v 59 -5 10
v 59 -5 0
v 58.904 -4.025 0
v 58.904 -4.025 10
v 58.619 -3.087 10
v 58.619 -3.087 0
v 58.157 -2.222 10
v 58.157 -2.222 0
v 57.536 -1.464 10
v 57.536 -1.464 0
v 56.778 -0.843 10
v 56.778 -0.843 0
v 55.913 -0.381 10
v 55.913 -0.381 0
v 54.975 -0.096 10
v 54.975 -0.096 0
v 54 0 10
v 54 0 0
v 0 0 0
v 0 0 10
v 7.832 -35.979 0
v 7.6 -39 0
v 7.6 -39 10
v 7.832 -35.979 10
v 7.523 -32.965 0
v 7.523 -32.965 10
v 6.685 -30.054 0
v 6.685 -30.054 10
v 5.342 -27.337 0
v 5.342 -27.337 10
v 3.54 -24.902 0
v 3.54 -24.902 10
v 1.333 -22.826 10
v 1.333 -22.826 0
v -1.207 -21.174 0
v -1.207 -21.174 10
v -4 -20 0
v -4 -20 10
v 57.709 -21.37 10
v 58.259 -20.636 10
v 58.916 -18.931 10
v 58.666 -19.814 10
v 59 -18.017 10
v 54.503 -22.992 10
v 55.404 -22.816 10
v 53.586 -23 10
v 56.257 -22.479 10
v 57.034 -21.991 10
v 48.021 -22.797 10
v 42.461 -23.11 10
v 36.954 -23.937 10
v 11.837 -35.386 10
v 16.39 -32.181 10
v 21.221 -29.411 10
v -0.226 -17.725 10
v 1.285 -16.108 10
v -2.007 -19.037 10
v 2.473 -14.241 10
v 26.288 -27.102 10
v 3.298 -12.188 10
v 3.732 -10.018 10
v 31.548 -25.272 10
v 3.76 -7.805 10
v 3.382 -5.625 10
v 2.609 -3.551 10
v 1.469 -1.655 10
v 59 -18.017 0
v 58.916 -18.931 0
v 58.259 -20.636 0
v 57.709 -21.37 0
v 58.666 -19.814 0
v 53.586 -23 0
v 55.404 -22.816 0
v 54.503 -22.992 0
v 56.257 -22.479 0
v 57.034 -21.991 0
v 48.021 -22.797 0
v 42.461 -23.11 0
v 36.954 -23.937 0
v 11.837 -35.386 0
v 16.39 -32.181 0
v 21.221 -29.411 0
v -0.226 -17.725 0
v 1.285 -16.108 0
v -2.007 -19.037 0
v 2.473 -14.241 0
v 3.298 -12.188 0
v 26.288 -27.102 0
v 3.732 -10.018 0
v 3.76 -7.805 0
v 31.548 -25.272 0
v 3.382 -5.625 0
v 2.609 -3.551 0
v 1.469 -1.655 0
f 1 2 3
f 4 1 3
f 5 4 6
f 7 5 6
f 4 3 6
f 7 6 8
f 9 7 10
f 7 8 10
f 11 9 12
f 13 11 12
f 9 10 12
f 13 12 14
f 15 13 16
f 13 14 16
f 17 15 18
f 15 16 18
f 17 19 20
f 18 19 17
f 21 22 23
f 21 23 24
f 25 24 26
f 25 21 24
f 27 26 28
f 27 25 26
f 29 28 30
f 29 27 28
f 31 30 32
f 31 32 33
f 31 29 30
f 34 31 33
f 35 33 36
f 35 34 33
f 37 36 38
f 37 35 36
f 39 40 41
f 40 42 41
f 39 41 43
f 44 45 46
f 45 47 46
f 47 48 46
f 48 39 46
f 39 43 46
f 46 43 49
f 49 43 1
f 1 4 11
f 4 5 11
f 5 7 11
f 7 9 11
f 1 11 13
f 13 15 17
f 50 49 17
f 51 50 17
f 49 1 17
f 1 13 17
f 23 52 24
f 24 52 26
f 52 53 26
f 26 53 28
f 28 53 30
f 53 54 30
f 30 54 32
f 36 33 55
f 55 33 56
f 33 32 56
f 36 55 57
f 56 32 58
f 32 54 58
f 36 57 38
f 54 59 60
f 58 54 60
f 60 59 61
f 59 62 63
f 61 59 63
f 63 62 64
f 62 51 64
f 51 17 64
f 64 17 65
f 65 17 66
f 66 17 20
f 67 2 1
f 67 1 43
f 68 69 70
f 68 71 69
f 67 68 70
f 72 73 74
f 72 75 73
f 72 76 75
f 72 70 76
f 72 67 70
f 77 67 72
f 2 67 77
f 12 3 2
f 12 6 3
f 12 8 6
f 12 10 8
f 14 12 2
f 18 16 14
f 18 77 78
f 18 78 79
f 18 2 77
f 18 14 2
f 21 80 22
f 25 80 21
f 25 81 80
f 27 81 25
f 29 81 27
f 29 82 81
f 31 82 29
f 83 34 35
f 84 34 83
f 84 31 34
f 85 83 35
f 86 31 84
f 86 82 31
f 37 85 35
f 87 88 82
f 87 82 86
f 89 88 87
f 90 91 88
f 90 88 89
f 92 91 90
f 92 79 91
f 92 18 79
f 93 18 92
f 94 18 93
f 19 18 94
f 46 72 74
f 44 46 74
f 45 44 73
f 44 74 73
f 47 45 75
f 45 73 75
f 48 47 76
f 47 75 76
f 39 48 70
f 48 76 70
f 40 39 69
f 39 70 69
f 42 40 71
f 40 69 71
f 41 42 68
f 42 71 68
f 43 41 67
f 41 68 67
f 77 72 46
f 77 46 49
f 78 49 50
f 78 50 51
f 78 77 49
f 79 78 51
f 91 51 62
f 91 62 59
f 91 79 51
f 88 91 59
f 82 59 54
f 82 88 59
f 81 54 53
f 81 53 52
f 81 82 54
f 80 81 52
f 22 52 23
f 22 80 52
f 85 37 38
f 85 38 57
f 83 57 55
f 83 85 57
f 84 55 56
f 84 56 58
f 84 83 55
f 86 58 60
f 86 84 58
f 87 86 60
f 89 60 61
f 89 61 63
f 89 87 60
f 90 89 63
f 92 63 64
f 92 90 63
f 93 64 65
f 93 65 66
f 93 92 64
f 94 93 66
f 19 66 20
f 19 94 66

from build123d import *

# Parameters (mm, degrees)
PAD_DEPTH = 10


with BuildPart() as part:
    # Sketch → Pad (new body)
    with BuildSketch(Plane.XY):
        with BuildLine():
            Line((0, 0), (54, 0))
            ThreePointArc((59, -5), (57.535534, -1.464466), (54, 0))
            Line((59, -5), (59, -18.017197))
            ThreePointArc((53.585664, -23), (57.385876, -21.696306), (59, -18.017197))
            ThreePointArc((53.585664, -23), (28.896907, -26.125735), (7.6, -39))
            ThreePointArc((7.6, -39), (5.342456, -27.337237), (-4, -20))
            ThreePointArc((-4, -20), (3.565231, -11.113046), (0, 0))
        make_face()
    extrude(amount=PAD_DEPTH)


solid = part.part
